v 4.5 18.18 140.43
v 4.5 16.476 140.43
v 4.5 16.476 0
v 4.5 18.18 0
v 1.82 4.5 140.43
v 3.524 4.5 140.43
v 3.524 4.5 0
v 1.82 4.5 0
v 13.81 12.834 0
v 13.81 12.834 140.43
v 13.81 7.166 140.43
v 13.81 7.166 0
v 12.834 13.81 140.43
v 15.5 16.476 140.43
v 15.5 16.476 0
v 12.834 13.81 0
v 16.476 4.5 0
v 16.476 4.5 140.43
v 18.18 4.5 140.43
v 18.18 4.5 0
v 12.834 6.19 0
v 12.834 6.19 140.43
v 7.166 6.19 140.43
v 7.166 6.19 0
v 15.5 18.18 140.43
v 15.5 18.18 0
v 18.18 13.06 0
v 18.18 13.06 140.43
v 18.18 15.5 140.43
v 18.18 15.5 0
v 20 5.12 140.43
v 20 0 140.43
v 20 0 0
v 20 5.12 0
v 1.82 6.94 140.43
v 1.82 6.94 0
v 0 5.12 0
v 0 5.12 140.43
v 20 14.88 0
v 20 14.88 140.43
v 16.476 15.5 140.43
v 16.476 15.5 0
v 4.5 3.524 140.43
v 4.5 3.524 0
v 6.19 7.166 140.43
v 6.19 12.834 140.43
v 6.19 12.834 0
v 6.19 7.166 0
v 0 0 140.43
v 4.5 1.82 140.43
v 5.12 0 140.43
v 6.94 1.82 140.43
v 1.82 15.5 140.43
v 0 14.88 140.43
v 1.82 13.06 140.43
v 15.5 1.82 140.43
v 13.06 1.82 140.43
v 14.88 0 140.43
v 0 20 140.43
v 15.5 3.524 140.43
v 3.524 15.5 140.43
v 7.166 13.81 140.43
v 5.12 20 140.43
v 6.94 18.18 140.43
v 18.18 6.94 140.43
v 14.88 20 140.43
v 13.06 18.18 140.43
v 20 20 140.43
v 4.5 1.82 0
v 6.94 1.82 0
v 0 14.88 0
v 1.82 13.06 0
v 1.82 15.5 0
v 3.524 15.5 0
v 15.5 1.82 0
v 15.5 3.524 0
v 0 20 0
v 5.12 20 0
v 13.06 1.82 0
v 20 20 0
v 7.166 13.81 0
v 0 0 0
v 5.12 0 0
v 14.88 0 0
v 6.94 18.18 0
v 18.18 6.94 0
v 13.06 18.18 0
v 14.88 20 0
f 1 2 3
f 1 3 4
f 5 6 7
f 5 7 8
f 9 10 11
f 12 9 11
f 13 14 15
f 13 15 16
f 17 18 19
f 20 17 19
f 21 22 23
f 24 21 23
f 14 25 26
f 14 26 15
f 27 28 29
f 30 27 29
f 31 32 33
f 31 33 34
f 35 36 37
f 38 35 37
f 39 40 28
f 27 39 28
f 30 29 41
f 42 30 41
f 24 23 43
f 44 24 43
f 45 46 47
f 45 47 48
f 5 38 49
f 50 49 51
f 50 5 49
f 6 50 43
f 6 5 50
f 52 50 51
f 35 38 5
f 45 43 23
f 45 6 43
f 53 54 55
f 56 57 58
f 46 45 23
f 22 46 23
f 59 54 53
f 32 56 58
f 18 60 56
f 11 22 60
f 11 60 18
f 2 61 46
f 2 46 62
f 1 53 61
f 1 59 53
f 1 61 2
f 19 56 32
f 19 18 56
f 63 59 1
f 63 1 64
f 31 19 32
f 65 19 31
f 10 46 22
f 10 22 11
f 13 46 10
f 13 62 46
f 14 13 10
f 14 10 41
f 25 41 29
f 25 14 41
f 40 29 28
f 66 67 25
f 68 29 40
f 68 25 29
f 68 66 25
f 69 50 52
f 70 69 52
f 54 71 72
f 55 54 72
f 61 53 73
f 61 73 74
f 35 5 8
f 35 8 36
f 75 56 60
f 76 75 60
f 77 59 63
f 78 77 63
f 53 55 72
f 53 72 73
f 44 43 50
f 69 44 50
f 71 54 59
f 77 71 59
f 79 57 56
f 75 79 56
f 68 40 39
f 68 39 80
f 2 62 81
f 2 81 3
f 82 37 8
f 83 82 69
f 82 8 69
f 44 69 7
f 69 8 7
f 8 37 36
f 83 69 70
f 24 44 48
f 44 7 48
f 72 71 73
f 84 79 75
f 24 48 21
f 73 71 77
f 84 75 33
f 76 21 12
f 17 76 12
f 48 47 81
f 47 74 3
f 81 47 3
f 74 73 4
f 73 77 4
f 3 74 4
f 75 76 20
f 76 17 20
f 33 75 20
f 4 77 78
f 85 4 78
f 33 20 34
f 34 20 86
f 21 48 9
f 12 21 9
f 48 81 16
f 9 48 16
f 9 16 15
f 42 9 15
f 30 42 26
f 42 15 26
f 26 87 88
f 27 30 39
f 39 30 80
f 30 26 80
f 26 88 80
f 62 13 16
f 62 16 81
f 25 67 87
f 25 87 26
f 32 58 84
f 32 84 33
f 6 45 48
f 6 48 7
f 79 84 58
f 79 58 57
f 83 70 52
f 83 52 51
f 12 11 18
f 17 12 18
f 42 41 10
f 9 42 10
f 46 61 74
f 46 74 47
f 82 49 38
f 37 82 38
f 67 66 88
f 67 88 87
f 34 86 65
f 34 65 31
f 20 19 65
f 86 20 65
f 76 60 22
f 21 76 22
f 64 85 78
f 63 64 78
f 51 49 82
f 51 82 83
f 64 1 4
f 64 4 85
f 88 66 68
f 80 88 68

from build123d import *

# Parameters (mm, degrees)
SKETCH1_W           = 20
SKETCH1_H           = 20
BOSS_EXTRUDE1_DEPTH = 140.43
CUT_EXTRUDE1_DEPTH  = 141.43


with BuildPart() as part:
    # Sketch1 → Boss-Extrude1 (new body)
    with BuildSketch(Plane.XY):
        with Locations((10, 10)):
            Rectangle(SKETCH1_W, SKETCH1_H)
    extrude(amount=BOSS_EXTRUDE1_DEPTH)

    # Sketch2 → Cut-Extrude1 (cut, through all)
    with BuildSketch(Plane.XY.offset(140.43)):
        Polygon((4.5, 18.18), (6.94, 18.18), (5.12, 20), (14.88, 20), (13.06, 18.18), (15.5, 18.18), (15.5, 16.475807358), (12.834192642, 13.81), (7.165807358, 13.81), (4.5, 16.475807358), align=None)
        Polygon((14.88, 0), (13.06, 1.82), (15.5, 1.82), (15.5, 3.524192642), (12.834192642, 6.19), (7.165807358, 6.19), (4.5, 3.524192642), (4.5, 1.82), (6.94, 1.82), (5.12, 0), align=None)
        Polygon((1.82, 4.5), (1.82, 6.94), (0, 5.12), (0, 14.88), (1.82, 13.06), (1.82, 15.5), (3.524192642, 15.5), (6.19, 12.834192642), (6.19, 7.165807358), (3.524192642, 4.5), align=None)
        Polygon((20, 14.88), (18.18, 13.06), (18.18, 15.5), (16.475807358, 15.5), (13.81, 12.834192642), (13.81, 7.165807358), (16.475807358, 4.5), (18.18, 4.5), (18.18, 6.94), (20, 5.12), align=None)
    extrude(amount=-CUT_EXTRUDE1_DEPTH, mode=Mode.SUBTRACT)


solid = part.part
